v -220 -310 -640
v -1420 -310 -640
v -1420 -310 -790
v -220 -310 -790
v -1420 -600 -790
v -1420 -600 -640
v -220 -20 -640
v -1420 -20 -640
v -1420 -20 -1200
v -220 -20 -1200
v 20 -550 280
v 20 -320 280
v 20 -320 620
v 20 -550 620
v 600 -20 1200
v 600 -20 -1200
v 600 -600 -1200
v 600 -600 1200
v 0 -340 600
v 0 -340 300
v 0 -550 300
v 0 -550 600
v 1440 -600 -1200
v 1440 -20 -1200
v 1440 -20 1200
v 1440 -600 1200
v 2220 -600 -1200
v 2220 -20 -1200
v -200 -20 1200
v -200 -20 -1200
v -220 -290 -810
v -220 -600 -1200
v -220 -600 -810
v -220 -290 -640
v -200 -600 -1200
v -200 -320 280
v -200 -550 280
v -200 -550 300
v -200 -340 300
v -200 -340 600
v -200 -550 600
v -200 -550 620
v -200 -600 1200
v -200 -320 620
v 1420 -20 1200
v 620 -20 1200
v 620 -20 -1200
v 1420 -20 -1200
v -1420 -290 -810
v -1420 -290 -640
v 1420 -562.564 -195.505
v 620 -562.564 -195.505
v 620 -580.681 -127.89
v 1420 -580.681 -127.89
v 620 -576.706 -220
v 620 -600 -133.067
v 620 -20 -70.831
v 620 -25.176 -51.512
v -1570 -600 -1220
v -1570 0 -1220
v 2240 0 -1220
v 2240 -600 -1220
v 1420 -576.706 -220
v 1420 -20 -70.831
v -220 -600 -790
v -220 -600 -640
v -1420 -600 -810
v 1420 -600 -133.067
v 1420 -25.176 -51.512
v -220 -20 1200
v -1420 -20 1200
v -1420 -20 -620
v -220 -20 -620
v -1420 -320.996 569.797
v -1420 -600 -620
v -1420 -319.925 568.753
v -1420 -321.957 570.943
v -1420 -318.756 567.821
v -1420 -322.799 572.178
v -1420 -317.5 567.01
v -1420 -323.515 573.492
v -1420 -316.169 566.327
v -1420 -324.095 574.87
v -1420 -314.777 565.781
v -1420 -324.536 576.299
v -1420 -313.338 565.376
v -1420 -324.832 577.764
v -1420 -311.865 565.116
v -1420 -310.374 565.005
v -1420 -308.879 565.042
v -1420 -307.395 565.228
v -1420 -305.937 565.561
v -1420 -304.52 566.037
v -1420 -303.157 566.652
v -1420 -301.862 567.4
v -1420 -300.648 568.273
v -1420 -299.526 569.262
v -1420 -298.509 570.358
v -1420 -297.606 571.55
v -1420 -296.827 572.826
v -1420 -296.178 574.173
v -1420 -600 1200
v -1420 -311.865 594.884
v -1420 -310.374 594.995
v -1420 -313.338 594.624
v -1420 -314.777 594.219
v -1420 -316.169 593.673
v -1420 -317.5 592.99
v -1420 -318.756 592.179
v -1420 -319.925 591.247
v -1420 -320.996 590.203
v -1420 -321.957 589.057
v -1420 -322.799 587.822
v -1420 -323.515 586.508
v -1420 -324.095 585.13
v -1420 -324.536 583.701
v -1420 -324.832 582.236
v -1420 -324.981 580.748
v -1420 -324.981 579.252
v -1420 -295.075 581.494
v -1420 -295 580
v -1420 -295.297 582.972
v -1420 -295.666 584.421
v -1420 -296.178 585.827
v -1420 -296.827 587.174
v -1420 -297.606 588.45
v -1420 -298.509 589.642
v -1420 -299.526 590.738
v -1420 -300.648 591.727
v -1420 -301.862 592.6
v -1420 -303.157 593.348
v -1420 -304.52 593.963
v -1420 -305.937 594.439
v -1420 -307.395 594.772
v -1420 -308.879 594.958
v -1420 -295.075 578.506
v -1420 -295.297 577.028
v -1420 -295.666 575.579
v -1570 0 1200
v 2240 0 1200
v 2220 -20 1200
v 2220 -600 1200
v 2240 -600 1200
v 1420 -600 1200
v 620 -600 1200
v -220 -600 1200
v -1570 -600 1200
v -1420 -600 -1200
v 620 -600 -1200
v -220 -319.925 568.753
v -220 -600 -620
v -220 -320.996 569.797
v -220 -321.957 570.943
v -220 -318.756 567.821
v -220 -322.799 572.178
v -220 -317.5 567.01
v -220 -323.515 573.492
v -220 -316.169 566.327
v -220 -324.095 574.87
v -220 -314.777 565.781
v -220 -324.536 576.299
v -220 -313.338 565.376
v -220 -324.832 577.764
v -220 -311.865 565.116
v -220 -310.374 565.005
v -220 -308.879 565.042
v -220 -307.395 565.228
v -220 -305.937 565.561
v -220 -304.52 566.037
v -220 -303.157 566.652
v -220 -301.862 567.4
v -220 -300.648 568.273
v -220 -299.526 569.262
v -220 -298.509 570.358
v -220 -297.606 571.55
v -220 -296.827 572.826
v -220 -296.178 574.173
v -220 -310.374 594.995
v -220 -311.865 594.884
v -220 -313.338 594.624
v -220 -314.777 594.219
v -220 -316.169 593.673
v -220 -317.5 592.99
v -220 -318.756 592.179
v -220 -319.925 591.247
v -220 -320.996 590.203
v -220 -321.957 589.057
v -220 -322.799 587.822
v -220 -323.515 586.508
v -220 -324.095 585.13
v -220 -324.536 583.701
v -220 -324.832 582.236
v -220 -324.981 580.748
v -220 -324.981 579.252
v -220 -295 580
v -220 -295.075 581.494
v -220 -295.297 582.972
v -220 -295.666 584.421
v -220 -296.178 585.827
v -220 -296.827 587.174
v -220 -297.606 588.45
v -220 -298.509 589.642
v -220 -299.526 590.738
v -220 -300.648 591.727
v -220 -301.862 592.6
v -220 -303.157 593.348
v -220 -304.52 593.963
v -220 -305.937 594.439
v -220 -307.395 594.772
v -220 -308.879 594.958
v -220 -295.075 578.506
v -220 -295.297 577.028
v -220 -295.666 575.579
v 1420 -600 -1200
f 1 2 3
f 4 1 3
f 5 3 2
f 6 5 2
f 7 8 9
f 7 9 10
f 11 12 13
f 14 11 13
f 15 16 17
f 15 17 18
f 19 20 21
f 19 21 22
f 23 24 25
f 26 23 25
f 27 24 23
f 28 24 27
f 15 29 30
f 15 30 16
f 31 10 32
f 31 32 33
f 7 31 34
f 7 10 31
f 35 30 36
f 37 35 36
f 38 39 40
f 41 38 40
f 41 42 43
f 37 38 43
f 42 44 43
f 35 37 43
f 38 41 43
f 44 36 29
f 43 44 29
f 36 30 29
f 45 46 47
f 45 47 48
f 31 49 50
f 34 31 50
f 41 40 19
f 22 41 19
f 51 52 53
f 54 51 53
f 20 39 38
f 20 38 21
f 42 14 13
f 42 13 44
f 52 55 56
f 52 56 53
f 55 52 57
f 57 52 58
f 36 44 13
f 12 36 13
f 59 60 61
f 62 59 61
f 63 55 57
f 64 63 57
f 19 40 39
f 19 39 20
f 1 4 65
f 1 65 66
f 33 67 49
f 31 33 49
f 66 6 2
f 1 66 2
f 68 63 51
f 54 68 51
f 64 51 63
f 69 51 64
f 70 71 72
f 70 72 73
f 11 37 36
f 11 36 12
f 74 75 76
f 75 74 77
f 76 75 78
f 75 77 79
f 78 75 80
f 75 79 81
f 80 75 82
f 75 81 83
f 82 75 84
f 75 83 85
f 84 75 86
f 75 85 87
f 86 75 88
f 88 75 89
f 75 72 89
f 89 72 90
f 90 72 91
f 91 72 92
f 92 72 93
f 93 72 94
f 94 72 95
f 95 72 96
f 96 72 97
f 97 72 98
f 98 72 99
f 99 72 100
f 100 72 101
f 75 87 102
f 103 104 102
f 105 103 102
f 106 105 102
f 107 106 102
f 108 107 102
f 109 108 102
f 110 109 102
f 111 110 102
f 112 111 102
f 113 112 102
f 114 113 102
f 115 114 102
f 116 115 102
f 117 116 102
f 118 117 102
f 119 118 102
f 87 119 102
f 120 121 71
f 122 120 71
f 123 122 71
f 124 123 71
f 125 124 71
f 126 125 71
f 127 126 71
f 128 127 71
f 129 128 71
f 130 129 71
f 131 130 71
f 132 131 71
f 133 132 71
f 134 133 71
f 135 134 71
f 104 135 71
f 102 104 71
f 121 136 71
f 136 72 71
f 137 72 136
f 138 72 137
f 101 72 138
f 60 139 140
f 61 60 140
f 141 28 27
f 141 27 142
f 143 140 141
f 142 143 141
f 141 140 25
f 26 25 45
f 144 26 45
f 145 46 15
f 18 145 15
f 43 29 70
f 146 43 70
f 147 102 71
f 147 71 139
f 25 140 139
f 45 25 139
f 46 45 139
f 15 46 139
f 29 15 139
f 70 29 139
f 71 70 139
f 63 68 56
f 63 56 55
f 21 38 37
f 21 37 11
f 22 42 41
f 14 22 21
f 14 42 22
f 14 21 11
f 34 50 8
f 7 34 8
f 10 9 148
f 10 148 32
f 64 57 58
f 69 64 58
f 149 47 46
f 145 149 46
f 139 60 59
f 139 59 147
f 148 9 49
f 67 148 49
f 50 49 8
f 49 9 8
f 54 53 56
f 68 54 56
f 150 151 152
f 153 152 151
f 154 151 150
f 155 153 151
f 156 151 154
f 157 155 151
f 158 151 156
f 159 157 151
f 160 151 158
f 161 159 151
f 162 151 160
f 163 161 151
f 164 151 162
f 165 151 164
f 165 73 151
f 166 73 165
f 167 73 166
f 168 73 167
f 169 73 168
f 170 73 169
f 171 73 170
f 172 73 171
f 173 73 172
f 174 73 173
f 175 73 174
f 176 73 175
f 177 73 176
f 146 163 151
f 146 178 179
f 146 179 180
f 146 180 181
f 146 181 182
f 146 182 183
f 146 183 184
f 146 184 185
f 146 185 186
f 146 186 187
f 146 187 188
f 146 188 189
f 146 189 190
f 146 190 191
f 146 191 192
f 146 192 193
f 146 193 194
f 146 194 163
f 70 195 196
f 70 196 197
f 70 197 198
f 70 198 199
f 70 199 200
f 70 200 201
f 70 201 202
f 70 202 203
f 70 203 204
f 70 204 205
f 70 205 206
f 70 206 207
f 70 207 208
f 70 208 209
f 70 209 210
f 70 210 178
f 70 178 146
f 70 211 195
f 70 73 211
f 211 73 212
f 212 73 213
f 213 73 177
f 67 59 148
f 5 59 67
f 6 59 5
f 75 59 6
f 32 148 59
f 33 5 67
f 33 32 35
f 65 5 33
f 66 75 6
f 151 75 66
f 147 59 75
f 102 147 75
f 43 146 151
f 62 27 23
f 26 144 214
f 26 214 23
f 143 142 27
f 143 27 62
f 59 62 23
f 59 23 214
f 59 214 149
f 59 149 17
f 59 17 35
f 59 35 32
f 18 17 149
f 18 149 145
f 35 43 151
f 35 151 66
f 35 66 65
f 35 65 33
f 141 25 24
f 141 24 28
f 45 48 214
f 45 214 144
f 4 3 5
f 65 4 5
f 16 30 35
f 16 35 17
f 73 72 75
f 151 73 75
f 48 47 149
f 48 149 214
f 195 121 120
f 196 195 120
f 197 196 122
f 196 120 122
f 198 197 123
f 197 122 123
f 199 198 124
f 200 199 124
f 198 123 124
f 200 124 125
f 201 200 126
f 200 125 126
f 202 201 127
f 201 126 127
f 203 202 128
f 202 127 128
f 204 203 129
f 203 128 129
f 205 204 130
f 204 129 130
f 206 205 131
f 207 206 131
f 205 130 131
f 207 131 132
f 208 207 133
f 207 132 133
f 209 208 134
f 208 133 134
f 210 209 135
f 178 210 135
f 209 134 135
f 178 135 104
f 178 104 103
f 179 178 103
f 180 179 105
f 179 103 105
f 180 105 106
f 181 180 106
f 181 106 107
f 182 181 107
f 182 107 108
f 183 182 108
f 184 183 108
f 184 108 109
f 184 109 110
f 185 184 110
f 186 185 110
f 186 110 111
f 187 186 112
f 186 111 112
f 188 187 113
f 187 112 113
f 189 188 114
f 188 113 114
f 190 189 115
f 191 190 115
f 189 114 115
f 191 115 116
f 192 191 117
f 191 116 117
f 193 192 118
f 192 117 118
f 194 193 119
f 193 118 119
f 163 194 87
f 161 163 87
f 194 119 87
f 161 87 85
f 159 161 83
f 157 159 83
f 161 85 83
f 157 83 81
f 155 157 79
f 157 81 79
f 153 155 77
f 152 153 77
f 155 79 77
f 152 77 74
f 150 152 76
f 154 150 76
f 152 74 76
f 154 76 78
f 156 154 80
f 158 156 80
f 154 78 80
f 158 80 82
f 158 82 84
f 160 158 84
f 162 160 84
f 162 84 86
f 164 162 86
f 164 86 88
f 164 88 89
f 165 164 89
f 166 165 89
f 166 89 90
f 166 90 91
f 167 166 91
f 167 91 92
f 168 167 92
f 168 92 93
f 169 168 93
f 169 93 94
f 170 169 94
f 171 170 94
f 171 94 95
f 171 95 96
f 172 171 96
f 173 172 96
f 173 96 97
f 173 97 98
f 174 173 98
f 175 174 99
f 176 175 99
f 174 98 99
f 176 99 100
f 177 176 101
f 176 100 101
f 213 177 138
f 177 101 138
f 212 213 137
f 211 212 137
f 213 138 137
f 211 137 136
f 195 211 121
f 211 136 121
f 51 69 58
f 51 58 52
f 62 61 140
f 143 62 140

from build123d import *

# Parameters (mm, degrees)
F0_W      = 1200
F0_H      = 2400
F0_W_2    = 130
F0_H_2    = 2420
F0_W_3    = 800
F1_DEPTH  = 600
F2_START  = 20
F2_DEPTH  = 580
F3_R      = 15
F4_DEPTH  = 1200
F6_START  = 820
F6_DEPTH  = 800
F8_START  = 300
F7_W      = 200
F7_H      = 300
F8_DEPTH  = 230
F9_START  = 320
F9_DEPTH  = 260
F10_W     = 780
F10_H     = 2400
F11_DEPTH = 600
F12_START = 20
F12_DEPTH = 580


with BuildPart() as f1:
    # F0 (on Front) → F1 (new body)
    with BuildSketch(Plane.XZ):
        with Locations((-820, 0)):
            Rectangle(F0_W, F0_H)
        with Locations((-1505, -10)):
            Rectangle(F0_W_2, F0_H_2)
        with Locations((200, 0)):
            Rectangle(F0_W_3, F0_H)
        with Locations((1020, 0)):
            Rectangle(F0_W_3, F0_H)
        Polygon((1420, 1200), (1420, -1200), (620, -1200), (620, 1200), (600, 1200), (600, -1200), (-200, -1200), (-200, 1200), (-220, 1200), (-220, -1200), (-1420, -1200), (-1420, 1200), (-1440, 1200), (-1440, -1220), (1440, -1220), (1440, 1200), align=None)
    extrude(amount=F1_DEPTH)

    # F0 (on Front) → F2 (cut)
    with BuildSketch(Plane.XZ.offset(F2_START)):
        with Locations((1020, 0)):
            Rectangle(F0_W_3, F0_H)
        with Locations((200, 0)):
            Rectangle(F0_W_3, F0_H)
        with Locations((-820, 0)):
            Rectangle(F0_W, F0_H)
    extrude(amount=F2_DEPTH, mode=Mode.SUBTRACT)

    # F3 (on face) → F4 (join, through all)
    with BuildSketch(Plane.YZ.offset(-1420)):
        with Locations((-310, 580)):
            Circle(F3_R)
        Polygon((-20, -620), (-600, -620), (-600, -640), (-310, -640), (-310, -790), (-600, -790), (-600, -810), (-290, -810), (-290, -640), (-20, -640), align=None)
    extrude(amount=F4_DEPTH)

    # F7 (on face) → F8 (join)
    with BuildSketch(Plane.XZ.offset(20).offset(F8_START)):
        Polygon((-200, 620), (-200, 600), (0, 600), (0, 300), (-200, 300), (-200, 280), (20, 280), (20, 620), align=None)
        with Locations((-100, 450)):
            Rectangle(F7_W, F7_H)
    extrude(amount=F8_DEPTH)

    # F7 (on face) → F9 (cut)
    with BuildSketch(Plane.XZ.offset(20).offset(F9_START)):
        with Locations((-100, 450)):
            Rectangle(F7_W, F7_H)
    extrude(amount=F9_DEPTH, mode=Mode.SUBTRACT)

    # F10 (on Front) → F11 (join)
    with BuildSketch(Plane.XZ):
        Polygon((1440, -1200), (1440, -1220), (2240, -1220), (2240, 1200), (2220, 1200), (2220, -1200), align=None)
        with Locations((1830, 0)):
            Rectangle(F10_W, F10_H)
    extrude(amount=F11_DEPTH)

    # F10 (on Front) → F12 (cut)
    with BuildSketch(Plane.XZ.offset(F12_START)):
        with Locations((1830, 0)):
            Rectangle(F10_W, F10_H)
    extrude(amount=F12_DEPTH, mode=Mode.SUBTRACT)


with BuildPart() as f6:
    # F5 (on face) → F6 (new body)
    with BuildSketch(Plane.YZ.offset(-200).offset(F6_START)):
        Polygon((-580.6814834742, -127.8902947319), (-600, -133.066675634), (-576.7062859408, -220), (-20, -70.8310002608), (-25.1763809021, -51.5124837351), (-562.564150317, -195.5051025722), align=None)
    extrude(amount=F6_DEPTH)


solid = Compound([f1.part, f6.part])
